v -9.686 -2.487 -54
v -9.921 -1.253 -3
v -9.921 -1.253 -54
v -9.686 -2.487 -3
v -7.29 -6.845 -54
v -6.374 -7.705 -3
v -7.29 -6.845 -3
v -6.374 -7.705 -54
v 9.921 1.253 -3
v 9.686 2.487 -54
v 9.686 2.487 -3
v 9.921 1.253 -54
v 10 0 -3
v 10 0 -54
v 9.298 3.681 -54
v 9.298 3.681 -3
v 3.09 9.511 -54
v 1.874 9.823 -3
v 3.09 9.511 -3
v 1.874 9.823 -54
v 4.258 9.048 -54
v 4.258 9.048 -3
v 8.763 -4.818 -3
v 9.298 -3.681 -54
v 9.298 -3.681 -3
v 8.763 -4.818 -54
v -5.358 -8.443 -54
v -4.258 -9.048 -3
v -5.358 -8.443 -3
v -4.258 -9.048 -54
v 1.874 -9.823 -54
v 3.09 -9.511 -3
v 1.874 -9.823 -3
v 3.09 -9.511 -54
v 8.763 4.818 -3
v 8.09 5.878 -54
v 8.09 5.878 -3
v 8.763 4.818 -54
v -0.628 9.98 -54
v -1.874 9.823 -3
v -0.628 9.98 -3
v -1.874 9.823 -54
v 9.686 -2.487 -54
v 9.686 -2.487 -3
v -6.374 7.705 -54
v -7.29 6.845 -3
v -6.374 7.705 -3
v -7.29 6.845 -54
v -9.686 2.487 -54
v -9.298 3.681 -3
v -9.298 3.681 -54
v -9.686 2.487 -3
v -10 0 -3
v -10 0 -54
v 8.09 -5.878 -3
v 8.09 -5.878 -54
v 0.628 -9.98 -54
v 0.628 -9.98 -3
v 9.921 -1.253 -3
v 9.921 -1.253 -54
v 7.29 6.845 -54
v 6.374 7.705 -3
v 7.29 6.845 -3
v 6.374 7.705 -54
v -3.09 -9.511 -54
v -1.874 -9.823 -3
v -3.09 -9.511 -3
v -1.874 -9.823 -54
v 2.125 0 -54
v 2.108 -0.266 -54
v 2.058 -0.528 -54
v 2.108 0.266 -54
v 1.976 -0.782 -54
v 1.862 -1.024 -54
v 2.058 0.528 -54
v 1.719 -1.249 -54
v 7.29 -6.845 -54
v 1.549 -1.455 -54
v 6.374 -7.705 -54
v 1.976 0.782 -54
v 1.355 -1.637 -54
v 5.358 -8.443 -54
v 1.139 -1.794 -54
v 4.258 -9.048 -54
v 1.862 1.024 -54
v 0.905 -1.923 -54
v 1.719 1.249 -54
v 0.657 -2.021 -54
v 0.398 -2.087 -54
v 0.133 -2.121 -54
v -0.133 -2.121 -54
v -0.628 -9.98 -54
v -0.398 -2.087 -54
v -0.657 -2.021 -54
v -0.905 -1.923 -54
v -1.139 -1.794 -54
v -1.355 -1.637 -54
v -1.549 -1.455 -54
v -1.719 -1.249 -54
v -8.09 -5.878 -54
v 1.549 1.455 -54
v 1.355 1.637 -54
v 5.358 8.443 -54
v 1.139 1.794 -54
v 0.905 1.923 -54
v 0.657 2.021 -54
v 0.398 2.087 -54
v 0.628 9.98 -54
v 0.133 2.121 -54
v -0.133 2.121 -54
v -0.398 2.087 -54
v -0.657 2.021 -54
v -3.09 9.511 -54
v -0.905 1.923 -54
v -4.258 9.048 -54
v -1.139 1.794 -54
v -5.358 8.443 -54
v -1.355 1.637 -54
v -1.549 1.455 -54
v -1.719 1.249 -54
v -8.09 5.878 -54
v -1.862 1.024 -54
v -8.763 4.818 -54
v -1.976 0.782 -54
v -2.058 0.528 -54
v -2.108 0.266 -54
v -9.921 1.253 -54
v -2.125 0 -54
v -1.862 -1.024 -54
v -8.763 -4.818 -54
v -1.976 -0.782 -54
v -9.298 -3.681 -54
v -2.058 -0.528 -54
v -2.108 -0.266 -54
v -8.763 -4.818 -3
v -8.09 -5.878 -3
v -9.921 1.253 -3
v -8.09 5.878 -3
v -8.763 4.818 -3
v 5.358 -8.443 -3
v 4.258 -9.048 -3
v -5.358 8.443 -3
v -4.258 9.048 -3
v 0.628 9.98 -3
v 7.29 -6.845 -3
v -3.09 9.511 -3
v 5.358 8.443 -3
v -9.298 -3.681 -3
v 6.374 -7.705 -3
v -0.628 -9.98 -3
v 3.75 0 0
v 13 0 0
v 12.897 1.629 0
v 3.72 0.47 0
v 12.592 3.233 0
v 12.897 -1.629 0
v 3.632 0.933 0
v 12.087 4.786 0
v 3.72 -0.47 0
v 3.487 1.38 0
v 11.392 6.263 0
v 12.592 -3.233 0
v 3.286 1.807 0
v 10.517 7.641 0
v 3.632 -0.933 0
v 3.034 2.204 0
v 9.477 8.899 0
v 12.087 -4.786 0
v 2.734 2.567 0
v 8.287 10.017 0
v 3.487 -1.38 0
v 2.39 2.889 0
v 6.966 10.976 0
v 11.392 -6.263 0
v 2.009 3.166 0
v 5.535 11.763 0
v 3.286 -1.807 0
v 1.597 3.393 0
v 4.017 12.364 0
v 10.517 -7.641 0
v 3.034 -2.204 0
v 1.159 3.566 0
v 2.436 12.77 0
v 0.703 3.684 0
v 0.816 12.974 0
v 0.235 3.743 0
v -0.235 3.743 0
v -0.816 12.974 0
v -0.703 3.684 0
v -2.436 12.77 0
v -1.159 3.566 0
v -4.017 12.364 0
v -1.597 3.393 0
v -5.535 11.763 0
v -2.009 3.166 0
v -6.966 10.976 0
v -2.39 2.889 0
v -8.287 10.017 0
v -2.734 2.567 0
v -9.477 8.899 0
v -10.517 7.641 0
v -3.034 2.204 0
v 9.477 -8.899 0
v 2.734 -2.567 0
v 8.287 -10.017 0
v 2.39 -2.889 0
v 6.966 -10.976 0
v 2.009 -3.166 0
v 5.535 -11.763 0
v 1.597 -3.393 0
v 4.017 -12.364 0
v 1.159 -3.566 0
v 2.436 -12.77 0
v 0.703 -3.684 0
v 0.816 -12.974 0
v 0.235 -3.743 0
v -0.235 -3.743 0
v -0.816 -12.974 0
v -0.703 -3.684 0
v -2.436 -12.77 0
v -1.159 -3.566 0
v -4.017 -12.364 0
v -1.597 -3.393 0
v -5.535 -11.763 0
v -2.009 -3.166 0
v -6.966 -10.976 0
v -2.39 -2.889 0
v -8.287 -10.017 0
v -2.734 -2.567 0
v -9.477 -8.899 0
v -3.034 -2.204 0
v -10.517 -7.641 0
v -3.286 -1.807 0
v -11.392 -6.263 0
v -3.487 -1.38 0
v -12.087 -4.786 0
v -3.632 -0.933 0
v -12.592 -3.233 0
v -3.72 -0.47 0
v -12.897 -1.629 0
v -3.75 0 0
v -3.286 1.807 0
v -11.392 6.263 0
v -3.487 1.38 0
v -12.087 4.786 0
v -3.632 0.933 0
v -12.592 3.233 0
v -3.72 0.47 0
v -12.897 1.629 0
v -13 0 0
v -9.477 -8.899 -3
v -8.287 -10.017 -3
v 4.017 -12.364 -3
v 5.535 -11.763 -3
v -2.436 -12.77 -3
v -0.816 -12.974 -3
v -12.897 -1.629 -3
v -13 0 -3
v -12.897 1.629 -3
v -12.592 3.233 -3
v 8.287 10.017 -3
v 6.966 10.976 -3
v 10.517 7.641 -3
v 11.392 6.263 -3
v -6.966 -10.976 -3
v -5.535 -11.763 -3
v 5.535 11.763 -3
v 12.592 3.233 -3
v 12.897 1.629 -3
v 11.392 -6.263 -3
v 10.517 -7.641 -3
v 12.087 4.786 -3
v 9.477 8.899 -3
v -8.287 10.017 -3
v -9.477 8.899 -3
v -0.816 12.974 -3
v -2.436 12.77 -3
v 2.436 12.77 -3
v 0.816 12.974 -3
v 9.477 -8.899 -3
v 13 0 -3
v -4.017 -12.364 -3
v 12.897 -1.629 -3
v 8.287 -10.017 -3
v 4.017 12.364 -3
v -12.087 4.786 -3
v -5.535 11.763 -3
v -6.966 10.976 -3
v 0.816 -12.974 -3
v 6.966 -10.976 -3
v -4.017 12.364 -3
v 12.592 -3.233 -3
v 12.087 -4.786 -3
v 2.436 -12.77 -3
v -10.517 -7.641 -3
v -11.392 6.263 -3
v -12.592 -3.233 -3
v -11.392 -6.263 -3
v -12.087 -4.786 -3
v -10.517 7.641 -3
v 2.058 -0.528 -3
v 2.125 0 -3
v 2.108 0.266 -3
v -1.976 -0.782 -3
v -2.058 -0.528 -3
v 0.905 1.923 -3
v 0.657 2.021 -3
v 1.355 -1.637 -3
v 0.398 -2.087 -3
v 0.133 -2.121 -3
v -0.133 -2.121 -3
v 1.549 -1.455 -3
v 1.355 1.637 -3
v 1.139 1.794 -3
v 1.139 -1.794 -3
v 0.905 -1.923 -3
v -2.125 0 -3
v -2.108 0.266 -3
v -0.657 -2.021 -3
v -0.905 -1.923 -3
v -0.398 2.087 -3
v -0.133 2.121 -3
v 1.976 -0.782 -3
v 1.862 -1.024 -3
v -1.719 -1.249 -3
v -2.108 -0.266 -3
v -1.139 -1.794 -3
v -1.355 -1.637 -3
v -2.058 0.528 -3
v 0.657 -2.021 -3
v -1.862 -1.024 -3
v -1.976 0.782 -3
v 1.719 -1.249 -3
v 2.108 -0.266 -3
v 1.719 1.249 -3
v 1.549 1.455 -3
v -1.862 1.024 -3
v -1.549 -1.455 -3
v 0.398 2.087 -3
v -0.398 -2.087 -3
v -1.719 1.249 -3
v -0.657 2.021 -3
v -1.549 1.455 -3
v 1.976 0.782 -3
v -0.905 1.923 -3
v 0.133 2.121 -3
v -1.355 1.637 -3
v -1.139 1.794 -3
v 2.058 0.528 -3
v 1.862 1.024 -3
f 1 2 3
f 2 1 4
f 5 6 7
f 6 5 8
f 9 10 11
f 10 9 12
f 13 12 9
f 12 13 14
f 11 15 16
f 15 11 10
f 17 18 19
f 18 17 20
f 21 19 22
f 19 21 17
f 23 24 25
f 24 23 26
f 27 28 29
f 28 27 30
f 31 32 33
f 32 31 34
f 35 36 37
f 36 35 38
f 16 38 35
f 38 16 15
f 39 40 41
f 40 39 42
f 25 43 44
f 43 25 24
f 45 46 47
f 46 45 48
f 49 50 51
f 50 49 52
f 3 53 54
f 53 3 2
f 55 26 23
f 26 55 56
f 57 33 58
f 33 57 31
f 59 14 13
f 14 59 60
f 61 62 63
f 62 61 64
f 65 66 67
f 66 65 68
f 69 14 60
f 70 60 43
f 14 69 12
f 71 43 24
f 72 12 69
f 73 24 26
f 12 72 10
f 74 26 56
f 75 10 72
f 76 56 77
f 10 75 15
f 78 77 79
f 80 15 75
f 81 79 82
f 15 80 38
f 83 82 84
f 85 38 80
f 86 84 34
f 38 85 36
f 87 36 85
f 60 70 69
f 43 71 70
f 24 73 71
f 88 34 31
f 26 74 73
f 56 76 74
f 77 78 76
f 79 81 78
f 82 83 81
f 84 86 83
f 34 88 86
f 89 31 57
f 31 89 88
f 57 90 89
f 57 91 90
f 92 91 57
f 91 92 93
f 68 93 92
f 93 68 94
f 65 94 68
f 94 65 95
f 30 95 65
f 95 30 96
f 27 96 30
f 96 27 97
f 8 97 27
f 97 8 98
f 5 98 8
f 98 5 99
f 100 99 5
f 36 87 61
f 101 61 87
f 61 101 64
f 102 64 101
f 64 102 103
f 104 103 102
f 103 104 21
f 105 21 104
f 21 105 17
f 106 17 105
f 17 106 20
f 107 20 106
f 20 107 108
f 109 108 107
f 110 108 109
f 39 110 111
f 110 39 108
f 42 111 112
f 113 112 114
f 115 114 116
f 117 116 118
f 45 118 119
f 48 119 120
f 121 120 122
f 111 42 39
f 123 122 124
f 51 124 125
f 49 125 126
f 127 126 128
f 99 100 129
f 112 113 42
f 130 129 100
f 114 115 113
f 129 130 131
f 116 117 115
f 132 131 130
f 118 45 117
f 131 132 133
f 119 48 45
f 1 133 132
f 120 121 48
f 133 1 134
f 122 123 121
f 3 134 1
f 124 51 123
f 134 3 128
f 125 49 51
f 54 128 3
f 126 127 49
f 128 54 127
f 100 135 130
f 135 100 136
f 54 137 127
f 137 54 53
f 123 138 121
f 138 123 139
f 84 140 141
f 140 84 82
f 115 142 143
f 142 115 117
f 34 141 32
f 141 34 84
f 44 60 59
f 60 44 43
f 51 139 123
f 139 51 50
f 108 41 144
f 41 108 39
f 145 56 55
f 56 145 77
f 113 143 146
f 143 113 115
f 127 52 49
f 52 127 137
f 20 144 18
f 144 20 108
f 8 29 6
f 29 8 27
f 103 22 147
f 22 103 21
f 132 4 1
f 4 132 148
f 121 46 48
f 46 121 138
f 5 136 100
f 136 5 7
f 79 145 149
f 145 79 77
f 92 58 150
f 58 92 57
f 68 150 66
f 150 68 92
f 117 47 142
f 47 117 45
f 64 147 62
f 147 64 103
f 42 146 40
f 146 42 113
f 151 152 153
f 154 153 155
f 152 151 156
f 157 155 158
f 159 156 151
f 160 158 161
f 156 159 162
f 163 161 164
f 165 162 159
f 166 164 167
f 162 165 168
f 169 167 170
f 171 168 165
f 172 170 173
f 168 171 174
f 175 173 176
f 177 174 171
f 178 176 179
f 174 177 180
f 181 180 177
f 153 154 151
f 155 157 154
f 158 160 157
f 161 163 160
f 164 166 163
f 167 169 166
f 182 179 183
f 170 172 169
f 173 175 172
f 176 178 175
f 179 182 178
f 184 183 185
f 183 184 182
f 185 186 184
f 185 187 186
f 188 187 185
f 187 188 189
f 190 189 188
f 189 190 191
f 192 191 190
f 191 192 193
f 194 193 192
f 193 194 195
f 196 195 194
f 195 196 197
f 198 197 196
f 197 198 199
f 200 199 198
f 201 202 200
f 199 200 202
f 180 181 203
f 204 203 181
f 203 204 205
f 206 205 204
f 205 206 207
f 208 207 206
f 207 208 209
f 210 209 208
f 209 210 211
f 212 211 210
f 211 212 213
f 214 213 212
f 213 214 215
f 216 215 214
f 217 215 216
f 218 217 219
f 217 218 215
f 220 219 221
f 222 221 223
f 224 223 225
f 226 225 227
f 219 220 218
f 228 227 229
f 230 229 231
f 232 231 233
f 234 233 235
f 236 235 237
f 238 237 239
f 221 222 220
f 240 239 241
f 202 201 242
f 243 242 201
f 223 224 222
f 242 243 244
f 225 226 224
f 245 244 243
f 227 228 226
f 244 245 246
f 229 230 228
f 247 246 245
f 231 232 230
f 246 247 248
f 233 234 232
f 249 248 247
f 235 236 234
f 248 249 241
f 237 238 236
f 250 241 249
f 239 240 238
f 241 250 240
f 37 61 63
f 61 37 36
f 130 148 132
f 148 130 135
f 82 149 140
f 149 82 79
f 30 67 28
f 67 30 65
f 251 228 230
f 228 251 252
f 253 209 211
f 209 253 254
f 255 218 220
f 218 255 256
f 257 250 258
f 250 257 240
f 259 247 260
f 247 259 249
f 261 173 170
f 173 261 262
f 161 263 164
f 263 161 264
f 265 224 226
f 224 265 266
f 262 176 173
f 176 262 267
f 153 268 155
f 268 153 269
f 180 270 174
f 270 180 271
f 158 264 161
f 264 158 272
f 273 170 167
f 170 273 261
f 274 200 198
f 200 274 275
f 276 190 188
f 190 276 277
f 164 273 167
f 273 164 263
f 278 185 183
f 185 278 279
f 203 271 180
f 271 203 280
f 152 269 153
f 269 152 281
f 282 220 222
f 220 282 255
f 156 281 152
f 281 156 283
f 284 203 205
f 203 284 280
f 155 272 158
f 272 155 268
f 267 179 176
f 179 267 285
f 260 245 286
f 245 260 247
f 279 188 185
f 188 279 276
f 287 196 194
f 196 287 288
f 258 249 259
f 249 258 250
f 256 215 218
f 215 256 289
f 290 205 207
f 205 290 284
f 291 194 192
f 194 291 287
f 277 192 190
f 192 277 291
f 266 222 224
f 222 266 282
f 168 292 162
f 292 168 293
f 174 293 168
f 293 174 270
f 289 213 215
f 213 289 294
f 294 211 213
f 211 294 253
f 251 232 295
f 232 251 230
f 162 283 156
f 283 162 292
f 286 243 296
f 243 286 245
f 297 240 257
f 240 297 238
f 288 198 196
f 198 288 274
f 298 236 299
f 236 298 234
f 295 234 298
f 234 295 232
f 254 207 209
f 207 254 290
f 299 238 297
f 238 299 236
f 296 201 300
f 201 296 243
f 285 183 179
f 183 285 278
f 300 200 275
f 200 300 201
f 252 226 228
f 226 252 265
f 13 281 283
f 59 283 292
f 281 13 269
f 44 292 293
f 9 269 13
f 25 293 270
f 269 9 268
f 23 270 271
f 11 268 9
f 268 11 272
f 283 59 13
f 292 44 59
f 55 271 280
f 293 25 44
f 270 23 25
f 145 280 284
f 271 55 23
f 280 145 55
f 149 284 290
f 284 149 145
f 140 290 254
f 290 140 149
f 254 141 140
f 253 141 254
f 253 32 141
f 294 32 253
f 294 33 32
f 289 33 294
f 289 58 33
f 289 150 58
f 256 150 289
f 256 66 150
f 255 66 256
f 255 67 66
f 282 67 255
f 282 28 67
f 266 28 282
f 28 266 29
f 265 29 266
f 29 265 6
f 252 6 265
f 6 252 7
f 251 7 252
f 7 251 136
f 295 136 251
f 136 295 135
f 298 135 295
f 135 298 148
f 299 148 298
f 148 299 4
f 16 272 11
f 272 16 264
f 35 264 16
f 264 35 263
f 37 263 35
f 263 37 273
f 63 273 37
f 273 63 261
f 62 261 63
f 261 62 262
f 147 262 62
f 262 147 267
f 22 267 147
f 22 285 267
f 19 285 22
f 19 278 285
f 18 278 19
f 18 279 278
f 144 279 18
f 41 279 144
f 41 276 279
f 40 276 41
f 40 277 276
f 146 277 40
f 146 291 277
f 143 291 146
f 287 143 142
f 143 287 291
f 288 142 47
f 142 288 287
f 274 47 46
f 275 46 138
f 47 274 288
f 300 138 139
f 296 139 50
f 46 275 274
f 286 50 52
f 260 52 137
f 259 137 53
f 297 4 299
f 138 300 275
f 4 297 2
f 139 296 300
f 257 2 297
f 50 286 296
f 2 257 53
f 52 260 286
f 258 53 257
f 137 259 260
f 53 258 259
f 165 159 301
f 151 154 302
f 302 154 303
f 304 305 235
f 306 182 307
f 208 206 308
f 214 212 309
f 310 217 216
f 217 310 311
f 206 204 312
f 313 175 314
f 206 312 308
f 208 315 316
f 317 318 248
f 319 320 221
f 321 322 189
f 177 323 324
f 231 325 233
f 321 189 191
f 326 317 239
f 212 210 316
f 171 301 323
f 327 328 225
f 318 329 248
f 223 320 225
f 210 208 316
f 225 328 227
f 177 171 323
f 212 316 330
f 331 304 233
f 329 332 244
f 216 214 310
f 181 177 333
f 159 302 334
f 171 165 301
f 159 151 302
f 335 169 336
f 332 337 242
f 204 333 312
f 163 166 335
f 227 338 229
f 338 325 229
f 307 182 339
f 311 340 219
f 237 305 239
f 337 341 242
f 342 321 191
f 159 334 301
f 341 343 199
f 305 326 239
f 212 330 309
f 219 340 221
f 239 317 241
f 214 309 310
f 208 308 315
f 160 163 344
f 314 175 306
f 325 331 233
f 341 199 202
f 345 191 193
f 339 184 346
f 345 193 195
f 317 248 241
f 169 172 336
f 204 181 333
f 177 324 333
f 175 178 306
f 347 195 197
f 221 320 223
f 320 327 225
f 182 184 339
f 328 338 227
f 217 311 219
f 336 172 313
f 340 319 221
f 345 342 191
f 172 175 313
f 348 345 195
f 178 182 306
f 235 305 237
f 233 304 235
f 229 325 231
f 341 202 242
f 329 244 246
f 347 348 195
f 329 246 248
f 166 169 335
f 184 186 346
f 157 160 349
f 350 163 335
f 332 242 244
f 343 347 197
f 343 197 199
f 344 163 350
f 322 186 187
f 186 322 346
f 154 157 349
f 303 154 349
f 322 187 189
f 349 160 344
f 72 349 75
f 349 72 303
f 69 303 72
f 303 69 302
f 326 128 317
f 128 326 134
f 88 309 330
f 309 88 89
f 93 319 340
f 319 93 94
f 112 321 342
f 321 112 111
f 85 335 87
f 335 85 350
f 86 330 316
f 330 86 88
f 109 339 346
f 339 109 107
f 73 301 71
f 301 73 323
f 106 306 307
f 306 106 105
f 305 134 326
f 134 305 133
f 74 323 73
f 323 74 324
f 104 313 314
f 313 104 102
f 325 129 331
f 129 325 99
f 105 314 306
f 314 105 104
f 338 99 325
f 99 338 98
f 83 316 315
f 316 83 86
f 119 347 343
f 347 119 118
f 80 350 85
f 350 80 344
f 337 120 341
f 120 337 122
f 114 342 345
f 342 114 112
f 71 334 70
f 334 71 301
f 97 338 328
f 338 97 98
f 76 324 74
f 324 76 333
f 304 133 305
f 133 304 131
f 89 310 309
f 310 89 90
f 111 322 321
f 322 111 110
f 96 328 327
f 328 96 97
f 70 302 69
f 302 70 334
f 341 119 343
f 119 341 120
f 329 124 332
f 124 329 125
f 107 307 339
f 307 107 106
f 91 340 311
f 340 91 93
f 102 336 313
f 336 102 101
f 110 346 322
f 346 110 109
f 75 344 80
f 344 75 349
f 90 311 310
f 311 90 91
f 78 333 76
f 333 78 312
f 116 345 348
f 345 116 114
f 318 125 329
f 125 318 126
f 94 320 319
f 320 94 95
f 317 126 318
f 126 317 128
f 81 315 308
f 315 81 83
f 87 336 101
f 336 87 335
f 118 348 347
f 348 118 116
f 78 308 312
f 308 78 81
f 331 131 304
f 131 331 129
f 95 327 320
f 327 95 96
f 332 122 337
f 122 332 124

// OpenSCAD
$fn = 50;


difference() {
	union() {
		translate(v = [0, 0, -54.0000000000]) {
			cylinder(h = 54, r = 10.0000000000);
		}
		translate(v = [0, 0, -3.0000000000]) {
			cylinder(h = 3, r = 13.0000000000);
		}
	}
	union() {
		translate(v = [0, 0, 0]) {
			rotate(a = [0, 0, 0]) {
				difference() {
					union() {
						#translate(v = [0, 0, -54.0000000000]) {
							cylinder(h = 54, r = 2.0000000000);
						}
						#translate(v = [0, 0, -3]) {
							cylinder(h = 3, r1 = 2.1250000000, r2 = 3.7500000000);
						}
						#translate(v = [0, 0, -54.0000000000]) {
							cylinder(h = 54, r = 2.1250000000);
						}
						#translate(v = [0, 0, -54.0000000000]) {
							cylinder(h = 54, r = 2.0000000000);
						}
					}
					union();
				}
			}
		}
	}
}
